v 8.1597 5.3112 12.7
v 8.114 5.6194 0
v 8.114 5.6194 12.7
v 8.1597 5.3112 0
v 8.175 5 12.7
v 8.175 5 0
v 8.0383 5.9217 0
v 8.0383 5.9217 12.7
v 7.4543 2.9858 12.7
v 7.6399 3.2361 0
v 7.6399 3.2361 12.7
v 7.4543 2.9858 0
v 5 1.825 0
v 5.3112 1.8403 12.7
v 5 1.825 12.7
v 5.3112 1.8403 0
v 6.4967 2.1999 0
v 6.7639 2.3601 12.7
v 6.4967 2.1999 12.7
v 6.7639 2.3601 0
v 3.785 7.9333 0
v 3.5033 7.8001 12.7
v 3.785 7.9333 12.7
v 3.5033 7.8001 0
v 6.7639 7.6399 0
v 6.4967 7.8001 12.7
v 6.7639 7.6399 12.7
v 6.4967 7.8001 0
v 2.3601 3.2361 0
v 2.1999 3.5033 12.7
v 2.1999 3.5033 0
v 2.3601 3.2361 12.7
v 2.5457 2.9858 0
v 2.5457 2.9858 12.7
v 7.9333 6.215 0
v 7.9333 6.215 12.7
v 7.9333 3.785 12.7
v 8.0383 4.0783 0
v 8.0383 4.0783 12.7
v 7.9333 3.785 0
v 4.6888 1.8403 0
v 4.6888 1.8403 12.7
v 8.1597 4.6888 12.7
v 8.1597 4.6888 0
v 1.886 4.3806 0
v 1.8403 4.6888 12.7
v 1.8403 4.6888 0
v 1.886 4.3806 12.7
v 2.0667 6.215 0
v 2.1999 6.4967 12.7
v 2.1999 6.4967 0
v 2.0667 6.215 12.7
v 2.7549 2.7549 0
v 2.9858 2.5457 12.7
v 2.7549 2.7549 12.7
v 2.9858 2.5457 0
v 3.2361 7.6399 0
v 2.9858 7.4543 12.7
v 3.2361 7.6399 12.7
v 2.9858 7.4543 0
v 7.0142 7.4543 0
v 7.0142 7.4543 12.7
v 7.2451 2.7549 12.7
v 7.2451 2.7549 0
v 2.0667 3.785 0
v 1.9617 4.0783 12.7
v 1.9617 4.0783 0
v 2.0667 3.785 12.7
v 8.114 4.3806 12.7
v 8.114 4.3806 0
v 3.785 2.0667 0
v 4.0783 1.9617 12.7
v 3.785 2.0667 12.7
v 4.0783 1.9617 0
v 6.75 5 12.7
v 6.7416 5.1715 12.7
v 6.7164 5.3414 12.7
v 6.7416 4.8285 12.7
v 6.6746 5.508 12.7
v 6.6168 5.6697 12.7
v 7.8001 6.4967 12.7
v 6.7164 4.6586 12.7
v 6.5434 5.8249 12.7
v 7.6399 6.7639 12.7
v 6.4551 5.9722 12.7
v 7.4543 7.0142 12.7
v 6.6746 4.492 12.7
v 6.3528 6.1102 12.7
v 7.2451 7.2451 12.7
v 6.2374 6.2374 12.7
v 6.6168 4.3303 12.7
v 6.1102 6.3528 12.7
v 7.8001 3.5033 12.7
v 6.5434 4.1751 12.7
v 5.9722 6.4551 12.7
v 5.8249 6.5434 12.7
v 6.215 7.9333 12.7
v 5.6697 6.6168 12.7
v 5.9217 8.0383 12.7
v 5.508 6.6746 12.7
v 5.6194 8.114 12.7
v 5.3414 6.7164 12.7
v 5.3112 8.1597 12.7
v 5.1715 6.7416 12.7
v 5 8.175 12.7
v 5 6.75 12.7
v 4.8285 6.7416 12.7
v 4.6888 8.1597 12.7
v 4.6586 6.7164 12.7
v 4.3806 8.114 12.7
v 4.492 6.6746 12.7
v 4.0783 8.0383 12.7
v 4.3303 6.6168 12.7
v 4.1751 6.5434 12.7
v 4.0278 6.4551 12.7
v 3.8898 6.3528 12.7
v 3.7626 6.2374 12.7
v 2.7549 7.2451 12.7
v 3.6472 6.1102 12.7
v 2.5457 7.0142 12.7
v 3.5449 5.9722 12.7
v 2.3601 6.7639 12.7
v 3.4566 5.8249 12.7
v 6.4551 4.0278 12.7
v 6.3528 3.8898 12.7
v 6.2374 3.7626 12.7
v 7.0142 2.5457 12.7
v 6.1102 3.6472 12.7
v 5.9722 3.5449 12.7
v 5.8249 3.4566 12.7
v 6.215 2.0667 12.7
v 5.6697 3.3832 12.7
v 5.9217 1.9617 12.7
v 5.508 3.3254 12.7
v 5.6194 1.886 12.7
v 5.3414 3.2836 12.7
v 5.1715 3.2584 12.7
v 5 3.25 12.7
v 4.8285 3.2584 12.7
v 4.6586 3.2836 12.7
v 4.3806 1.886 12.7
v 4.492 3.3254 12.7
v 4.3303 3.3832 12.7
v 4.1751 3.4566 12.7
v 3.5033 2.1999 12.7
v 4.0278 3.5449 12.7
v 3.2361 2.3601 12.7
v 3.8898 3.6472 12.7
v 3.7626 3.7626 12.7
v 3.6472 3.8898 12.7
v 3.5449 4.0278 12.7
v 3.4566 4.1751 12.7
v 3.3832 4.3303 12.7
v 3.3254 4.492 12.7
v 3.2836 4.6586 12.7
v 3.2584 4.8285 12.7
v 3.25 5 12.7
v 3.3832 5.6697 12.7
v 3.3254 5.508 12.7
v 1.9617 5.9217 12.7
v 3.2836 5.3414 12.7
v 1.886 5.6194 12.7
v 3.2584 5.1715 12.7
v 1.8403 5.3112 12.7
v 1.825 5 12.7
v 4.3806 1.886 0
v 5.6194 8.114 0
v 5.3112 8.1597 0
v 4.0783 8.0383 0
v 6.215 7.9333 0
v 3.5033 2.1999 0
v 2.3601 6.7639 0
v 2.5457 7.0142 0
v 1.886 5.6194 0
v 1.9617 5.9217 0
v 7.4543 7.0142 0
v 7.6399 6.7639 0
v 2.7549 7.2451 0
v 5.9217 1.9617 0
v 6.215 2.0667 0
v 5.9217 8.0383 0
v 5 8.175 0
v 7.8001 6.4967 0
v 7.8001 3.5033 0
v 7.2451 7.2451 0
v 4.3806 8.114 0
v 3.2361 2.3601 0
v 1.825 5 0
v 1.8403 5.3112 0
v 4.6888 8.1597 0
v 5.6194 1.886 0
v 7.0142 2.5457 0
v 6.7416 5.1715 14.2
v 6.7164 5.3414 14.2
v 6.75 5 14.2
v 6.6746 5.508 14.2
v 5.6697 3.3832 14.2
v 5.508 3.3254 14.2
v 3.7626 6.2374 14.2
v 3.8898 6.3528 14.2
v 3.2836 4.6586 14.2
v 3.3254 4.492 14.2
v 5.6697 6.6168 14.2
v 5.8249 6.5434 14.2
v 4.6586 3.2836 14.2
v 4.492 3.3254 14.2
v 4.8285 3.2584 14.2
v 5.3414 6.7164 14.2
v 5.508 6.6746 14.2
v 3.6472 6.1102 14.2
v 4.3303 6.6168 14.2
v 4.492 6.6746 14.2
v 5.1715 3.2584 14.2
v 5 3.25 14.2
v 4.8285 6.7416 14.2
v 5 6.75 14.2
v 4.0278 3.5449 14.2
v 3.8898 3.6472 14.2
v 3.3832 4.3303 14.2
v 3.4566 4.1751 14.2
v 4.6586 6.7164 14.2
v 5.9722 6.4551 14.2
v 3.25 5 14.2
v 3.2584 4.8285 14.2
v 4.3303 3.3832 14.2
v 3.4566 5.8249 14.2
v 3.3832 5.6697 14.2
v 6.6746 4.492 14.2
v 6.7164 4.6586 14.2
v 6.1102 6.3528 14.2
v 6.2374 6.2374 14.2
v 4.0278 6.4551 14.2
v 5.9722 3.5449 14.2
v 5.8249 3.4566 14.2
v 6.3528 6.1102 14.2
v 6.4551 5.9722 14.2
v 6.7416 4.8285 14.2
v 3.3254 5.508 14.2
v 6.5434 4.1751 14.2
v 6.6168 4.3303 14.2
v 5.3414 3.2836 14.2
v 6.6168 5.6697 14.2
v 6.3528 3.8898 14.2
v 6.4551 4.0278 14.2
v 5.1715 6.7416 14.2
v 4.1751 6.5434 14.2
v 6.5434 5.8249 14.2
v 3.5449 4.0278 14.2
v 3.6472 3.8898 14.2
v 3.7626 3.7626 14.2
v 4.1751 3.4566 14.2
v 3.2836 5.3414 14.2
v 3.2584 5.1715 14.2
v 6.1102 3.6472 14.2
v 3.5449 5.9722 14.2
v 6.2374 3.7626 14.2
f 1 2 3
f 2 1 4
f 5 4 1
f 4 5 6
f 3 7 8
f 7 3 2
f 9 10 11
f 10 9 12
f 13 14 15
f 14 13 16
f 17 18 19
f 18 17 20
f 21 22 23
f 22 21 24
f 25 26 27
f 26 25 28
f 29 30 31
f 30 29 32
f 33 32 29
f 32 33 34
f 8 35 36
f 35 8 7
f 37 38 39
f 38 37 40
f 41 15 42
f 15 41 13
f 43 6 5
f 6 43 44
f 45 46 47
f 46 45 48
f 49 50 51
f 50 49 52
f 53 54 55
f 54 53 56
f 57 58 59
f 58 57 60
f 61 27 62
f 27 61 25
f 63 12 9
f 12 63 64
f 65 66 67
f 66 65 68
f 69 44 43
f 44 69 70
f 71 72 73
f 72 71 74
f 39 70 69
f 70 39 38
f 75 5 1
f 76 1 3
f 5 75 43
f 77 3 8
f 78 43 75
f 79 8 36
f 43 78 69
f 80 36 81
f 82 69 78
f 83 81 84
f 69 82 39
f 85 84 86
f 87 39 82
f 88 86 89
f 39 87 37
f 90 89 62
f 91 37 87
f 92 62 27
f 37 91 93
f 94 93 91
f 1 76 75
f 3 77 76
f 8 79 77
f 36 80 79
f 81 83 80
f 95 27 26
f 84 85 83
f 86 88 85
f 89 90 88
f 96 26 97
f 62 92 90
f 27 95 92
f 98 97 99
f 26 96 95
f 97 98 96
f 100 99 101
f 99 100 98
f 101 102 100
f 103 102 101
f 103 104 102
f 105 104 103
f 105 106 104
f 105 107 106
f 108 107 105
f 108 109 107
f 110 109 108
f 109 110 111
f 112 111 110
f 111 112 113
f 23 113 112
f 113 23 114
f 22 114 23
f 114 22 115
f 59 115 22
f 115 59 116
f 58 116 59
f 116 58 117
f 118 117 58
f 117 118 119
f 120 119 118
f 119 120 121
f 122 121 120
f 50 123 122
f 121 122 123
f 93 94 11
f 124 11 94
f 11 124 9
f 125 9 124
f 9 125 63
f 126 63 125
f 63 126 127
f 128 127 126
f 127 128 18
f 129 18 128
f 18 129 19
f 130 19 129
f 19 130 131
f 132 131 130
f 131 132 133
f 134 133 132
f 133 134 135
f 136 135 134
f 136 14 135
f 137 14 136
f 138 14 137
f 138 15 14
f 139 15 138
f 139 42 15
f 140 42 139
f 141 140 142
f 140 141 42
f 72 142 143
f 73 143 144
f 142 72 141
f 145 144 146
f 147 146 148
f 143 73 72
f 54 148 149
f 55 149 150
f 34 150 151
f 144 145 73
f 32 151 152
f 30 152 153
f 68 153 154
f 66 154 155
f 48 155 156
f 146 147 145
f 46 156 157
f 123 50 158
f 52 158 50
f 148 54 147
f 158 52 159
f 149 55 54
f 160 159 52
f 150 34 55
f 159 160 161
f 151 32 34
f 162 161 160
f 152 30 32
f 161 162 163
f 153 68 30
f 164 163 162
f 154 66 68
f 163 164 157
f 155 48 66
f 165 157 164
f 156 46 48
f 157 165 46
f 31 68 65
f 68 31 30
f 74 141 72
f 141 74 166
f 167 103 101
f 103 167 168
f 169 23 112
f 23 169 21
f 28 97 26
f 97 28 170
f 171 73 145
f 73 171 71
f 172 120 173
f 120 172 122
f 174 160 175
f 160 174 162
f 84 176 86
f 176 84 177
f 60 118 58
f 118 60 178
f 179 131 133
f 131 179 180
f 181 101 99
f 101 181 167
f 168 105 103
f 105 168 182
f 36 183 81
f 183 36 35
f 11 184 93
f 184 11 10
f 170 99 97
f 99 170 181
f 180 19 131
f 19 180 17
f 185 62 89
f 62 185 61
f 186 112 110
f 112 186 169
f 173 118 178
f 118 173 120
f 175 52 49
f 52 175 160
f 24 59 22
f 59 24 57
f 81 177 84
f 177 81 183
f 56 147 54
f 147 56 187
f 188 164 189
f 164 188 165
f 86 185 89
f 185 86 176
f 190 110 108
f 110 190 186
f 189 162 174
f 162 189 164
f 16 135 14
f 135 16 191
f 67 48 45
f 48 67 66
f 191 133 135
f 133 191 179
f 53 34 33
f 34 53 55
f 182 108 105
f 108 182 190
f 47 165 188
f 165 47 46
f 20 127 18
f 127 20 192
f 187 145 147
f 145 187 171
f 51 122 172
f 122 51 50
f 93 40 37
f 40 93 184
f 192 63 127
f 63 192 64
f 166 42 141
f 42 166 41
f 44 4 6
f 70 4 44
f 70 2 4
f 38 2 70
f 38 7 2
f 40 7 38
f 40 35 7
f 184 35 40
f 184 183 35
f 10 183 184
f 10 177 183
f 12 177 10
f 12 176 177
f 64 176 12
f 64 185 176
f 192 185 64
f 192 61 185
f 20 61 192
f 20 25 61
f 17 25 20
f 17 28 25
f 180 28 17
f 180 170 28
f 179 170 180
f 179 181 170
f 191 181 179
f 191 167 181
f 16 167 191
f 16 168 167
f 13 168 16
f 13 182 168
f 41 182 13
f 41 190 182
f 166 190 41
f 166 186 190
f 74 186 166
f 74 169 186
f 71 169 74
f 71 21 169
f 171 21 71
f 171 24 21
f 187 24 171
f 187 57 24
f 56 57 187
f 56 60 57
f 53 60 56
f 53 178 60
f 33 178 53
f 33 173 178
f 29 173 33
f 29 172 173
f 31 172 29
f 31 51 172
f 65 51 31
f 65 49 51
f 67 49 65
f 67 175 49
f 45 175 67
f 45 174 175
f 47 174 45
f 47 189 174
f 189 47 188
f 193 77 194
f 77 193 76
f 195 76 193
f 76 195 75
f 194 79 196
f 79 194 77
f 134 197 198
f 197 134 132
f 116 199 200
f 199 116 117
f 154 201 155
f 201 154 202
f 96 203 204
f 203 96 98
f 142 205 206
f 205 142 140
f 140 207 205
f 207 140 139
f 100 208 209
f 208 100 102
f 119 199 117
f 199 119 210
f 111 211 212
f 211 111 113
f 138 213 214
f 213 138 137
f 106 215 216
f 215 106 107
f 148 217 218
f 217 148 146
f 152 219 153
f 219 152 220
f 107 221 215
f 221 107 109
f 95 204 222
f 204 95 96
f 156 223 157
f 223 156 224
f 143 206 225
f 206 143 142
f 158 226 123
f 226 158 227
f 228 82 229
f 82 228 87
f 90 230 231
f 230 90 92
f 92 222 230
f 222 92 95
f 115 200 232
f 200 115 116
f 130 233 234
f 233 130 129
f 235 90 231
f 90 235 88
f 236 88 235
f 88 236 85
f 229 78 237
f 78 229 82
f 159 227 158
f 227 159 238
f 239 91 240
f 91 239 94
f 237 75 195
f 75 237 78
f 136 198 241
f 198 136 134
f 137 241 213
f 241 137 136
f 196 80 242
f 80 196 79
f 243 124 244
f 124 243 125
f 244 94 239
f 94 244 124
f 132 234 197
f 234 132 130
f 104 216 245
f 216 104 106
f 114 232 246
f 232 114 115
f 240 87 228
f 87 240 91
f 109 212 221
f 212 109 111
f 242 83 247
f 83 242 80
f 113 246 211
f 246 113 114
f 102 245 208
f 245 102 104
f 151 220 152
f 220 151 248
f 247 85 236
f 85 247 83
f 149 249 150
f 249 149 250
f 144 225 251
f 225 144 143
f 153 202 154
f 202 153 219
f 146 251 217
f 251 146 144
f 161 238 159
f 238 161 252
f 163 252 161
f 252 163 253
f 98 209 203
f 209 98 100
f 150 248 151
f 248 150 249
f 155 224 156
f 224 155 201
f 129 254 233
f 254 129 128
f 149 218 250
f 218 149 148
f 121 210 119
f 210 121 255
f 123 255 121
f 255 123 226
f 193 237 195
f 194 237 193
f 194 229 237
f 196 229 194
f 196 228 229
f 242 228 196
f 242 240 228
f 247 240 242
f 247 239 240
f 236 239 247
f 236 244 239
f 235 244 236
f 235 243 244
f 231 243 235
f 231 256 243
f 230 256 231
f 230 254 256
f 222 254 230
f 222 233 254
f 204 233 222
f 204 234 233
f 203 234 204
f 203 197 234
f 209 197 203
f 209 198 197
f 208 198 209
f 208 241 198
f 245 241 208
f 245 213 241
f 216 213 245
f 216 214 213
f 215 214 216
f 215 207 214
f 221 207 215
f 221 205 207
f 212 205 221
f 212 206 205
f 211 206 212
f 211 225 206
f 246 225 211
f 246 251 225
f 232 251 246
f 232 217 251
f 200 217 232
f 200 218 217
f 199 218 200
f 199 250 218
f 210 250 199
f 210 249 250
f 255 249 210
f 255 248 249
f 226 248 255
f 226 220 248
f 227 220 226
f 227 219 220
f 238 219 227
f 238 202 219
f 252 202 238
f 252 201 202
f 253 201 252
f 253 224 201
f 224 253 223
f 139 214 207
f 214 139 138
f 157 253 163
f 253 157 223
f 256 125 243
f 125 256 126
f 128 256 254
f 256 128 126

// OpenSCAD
// file: post.scad
tip_dia1 = 3.5;			/* mounting hole ID */
tip_dia2 = 3.5;
tip_hgt = 1.6;			/* length of tip through hole */

peg_dia = 0.25*mm;		/* diameter of peg PCB rests on */
peg_hgt = 0.25*mm;

// support post
module post_at( x, y) {
     translate( [x, y, 0]) {
	  cylinder( h=total_hgt, d=peg_dia);
	  translate( [0, 0, total_hgt-e])
	       cylinder( h=tip_hgt, d1=tip_dia1, d2=tip_dia2);
     }
}
// main file
//
// support bracket for 8x8 displays
//

$fn = 64;
e = 0.1;
mm = 25.4;

include <post.scad>;

ndigit = 1;

bracket_wid = 32;		/* width of one panel */
bracket_len = 9;		/* bracket width (in Y) */
bracket_hgt = 1;

total_hgt = 0.5*mm;		/* overall bracket height (back to pcb) */

hole_dia = 0.15*mm;

// mounting hole
module hole_at( x, y) {
     translate( [x, y, -e])
	  cylinder( d=hole_dia, h=bracket_hgt+2*e);
}

module bracket() {
     difference() {
	  cube( [bracket_wid+e, bracket_wid+e, bracket_hgt]);
	  hole_at( bracket_wid/2, 0.2*mm);
	  hole_at( bracket_wid/2, bracket_wid-0.2*mm);
     }
     post_at( 3, 5.9);
     post_at( 32-3, 5.9);
     post_at( 3, 32-5.9);
     post_at( 32-3, 32-5.9);
}

// set of <ndigit> brackets
module multi_bracket() {
     for( i=[0:ndigit-1]) {
	  translate( [i*bracket_wid, 0, 0])
	       bracket();
     }
}

// single peg for testing
module test_peg() {
     post_at( 5, 5);
}

// multi_bracket();


test_peg();
